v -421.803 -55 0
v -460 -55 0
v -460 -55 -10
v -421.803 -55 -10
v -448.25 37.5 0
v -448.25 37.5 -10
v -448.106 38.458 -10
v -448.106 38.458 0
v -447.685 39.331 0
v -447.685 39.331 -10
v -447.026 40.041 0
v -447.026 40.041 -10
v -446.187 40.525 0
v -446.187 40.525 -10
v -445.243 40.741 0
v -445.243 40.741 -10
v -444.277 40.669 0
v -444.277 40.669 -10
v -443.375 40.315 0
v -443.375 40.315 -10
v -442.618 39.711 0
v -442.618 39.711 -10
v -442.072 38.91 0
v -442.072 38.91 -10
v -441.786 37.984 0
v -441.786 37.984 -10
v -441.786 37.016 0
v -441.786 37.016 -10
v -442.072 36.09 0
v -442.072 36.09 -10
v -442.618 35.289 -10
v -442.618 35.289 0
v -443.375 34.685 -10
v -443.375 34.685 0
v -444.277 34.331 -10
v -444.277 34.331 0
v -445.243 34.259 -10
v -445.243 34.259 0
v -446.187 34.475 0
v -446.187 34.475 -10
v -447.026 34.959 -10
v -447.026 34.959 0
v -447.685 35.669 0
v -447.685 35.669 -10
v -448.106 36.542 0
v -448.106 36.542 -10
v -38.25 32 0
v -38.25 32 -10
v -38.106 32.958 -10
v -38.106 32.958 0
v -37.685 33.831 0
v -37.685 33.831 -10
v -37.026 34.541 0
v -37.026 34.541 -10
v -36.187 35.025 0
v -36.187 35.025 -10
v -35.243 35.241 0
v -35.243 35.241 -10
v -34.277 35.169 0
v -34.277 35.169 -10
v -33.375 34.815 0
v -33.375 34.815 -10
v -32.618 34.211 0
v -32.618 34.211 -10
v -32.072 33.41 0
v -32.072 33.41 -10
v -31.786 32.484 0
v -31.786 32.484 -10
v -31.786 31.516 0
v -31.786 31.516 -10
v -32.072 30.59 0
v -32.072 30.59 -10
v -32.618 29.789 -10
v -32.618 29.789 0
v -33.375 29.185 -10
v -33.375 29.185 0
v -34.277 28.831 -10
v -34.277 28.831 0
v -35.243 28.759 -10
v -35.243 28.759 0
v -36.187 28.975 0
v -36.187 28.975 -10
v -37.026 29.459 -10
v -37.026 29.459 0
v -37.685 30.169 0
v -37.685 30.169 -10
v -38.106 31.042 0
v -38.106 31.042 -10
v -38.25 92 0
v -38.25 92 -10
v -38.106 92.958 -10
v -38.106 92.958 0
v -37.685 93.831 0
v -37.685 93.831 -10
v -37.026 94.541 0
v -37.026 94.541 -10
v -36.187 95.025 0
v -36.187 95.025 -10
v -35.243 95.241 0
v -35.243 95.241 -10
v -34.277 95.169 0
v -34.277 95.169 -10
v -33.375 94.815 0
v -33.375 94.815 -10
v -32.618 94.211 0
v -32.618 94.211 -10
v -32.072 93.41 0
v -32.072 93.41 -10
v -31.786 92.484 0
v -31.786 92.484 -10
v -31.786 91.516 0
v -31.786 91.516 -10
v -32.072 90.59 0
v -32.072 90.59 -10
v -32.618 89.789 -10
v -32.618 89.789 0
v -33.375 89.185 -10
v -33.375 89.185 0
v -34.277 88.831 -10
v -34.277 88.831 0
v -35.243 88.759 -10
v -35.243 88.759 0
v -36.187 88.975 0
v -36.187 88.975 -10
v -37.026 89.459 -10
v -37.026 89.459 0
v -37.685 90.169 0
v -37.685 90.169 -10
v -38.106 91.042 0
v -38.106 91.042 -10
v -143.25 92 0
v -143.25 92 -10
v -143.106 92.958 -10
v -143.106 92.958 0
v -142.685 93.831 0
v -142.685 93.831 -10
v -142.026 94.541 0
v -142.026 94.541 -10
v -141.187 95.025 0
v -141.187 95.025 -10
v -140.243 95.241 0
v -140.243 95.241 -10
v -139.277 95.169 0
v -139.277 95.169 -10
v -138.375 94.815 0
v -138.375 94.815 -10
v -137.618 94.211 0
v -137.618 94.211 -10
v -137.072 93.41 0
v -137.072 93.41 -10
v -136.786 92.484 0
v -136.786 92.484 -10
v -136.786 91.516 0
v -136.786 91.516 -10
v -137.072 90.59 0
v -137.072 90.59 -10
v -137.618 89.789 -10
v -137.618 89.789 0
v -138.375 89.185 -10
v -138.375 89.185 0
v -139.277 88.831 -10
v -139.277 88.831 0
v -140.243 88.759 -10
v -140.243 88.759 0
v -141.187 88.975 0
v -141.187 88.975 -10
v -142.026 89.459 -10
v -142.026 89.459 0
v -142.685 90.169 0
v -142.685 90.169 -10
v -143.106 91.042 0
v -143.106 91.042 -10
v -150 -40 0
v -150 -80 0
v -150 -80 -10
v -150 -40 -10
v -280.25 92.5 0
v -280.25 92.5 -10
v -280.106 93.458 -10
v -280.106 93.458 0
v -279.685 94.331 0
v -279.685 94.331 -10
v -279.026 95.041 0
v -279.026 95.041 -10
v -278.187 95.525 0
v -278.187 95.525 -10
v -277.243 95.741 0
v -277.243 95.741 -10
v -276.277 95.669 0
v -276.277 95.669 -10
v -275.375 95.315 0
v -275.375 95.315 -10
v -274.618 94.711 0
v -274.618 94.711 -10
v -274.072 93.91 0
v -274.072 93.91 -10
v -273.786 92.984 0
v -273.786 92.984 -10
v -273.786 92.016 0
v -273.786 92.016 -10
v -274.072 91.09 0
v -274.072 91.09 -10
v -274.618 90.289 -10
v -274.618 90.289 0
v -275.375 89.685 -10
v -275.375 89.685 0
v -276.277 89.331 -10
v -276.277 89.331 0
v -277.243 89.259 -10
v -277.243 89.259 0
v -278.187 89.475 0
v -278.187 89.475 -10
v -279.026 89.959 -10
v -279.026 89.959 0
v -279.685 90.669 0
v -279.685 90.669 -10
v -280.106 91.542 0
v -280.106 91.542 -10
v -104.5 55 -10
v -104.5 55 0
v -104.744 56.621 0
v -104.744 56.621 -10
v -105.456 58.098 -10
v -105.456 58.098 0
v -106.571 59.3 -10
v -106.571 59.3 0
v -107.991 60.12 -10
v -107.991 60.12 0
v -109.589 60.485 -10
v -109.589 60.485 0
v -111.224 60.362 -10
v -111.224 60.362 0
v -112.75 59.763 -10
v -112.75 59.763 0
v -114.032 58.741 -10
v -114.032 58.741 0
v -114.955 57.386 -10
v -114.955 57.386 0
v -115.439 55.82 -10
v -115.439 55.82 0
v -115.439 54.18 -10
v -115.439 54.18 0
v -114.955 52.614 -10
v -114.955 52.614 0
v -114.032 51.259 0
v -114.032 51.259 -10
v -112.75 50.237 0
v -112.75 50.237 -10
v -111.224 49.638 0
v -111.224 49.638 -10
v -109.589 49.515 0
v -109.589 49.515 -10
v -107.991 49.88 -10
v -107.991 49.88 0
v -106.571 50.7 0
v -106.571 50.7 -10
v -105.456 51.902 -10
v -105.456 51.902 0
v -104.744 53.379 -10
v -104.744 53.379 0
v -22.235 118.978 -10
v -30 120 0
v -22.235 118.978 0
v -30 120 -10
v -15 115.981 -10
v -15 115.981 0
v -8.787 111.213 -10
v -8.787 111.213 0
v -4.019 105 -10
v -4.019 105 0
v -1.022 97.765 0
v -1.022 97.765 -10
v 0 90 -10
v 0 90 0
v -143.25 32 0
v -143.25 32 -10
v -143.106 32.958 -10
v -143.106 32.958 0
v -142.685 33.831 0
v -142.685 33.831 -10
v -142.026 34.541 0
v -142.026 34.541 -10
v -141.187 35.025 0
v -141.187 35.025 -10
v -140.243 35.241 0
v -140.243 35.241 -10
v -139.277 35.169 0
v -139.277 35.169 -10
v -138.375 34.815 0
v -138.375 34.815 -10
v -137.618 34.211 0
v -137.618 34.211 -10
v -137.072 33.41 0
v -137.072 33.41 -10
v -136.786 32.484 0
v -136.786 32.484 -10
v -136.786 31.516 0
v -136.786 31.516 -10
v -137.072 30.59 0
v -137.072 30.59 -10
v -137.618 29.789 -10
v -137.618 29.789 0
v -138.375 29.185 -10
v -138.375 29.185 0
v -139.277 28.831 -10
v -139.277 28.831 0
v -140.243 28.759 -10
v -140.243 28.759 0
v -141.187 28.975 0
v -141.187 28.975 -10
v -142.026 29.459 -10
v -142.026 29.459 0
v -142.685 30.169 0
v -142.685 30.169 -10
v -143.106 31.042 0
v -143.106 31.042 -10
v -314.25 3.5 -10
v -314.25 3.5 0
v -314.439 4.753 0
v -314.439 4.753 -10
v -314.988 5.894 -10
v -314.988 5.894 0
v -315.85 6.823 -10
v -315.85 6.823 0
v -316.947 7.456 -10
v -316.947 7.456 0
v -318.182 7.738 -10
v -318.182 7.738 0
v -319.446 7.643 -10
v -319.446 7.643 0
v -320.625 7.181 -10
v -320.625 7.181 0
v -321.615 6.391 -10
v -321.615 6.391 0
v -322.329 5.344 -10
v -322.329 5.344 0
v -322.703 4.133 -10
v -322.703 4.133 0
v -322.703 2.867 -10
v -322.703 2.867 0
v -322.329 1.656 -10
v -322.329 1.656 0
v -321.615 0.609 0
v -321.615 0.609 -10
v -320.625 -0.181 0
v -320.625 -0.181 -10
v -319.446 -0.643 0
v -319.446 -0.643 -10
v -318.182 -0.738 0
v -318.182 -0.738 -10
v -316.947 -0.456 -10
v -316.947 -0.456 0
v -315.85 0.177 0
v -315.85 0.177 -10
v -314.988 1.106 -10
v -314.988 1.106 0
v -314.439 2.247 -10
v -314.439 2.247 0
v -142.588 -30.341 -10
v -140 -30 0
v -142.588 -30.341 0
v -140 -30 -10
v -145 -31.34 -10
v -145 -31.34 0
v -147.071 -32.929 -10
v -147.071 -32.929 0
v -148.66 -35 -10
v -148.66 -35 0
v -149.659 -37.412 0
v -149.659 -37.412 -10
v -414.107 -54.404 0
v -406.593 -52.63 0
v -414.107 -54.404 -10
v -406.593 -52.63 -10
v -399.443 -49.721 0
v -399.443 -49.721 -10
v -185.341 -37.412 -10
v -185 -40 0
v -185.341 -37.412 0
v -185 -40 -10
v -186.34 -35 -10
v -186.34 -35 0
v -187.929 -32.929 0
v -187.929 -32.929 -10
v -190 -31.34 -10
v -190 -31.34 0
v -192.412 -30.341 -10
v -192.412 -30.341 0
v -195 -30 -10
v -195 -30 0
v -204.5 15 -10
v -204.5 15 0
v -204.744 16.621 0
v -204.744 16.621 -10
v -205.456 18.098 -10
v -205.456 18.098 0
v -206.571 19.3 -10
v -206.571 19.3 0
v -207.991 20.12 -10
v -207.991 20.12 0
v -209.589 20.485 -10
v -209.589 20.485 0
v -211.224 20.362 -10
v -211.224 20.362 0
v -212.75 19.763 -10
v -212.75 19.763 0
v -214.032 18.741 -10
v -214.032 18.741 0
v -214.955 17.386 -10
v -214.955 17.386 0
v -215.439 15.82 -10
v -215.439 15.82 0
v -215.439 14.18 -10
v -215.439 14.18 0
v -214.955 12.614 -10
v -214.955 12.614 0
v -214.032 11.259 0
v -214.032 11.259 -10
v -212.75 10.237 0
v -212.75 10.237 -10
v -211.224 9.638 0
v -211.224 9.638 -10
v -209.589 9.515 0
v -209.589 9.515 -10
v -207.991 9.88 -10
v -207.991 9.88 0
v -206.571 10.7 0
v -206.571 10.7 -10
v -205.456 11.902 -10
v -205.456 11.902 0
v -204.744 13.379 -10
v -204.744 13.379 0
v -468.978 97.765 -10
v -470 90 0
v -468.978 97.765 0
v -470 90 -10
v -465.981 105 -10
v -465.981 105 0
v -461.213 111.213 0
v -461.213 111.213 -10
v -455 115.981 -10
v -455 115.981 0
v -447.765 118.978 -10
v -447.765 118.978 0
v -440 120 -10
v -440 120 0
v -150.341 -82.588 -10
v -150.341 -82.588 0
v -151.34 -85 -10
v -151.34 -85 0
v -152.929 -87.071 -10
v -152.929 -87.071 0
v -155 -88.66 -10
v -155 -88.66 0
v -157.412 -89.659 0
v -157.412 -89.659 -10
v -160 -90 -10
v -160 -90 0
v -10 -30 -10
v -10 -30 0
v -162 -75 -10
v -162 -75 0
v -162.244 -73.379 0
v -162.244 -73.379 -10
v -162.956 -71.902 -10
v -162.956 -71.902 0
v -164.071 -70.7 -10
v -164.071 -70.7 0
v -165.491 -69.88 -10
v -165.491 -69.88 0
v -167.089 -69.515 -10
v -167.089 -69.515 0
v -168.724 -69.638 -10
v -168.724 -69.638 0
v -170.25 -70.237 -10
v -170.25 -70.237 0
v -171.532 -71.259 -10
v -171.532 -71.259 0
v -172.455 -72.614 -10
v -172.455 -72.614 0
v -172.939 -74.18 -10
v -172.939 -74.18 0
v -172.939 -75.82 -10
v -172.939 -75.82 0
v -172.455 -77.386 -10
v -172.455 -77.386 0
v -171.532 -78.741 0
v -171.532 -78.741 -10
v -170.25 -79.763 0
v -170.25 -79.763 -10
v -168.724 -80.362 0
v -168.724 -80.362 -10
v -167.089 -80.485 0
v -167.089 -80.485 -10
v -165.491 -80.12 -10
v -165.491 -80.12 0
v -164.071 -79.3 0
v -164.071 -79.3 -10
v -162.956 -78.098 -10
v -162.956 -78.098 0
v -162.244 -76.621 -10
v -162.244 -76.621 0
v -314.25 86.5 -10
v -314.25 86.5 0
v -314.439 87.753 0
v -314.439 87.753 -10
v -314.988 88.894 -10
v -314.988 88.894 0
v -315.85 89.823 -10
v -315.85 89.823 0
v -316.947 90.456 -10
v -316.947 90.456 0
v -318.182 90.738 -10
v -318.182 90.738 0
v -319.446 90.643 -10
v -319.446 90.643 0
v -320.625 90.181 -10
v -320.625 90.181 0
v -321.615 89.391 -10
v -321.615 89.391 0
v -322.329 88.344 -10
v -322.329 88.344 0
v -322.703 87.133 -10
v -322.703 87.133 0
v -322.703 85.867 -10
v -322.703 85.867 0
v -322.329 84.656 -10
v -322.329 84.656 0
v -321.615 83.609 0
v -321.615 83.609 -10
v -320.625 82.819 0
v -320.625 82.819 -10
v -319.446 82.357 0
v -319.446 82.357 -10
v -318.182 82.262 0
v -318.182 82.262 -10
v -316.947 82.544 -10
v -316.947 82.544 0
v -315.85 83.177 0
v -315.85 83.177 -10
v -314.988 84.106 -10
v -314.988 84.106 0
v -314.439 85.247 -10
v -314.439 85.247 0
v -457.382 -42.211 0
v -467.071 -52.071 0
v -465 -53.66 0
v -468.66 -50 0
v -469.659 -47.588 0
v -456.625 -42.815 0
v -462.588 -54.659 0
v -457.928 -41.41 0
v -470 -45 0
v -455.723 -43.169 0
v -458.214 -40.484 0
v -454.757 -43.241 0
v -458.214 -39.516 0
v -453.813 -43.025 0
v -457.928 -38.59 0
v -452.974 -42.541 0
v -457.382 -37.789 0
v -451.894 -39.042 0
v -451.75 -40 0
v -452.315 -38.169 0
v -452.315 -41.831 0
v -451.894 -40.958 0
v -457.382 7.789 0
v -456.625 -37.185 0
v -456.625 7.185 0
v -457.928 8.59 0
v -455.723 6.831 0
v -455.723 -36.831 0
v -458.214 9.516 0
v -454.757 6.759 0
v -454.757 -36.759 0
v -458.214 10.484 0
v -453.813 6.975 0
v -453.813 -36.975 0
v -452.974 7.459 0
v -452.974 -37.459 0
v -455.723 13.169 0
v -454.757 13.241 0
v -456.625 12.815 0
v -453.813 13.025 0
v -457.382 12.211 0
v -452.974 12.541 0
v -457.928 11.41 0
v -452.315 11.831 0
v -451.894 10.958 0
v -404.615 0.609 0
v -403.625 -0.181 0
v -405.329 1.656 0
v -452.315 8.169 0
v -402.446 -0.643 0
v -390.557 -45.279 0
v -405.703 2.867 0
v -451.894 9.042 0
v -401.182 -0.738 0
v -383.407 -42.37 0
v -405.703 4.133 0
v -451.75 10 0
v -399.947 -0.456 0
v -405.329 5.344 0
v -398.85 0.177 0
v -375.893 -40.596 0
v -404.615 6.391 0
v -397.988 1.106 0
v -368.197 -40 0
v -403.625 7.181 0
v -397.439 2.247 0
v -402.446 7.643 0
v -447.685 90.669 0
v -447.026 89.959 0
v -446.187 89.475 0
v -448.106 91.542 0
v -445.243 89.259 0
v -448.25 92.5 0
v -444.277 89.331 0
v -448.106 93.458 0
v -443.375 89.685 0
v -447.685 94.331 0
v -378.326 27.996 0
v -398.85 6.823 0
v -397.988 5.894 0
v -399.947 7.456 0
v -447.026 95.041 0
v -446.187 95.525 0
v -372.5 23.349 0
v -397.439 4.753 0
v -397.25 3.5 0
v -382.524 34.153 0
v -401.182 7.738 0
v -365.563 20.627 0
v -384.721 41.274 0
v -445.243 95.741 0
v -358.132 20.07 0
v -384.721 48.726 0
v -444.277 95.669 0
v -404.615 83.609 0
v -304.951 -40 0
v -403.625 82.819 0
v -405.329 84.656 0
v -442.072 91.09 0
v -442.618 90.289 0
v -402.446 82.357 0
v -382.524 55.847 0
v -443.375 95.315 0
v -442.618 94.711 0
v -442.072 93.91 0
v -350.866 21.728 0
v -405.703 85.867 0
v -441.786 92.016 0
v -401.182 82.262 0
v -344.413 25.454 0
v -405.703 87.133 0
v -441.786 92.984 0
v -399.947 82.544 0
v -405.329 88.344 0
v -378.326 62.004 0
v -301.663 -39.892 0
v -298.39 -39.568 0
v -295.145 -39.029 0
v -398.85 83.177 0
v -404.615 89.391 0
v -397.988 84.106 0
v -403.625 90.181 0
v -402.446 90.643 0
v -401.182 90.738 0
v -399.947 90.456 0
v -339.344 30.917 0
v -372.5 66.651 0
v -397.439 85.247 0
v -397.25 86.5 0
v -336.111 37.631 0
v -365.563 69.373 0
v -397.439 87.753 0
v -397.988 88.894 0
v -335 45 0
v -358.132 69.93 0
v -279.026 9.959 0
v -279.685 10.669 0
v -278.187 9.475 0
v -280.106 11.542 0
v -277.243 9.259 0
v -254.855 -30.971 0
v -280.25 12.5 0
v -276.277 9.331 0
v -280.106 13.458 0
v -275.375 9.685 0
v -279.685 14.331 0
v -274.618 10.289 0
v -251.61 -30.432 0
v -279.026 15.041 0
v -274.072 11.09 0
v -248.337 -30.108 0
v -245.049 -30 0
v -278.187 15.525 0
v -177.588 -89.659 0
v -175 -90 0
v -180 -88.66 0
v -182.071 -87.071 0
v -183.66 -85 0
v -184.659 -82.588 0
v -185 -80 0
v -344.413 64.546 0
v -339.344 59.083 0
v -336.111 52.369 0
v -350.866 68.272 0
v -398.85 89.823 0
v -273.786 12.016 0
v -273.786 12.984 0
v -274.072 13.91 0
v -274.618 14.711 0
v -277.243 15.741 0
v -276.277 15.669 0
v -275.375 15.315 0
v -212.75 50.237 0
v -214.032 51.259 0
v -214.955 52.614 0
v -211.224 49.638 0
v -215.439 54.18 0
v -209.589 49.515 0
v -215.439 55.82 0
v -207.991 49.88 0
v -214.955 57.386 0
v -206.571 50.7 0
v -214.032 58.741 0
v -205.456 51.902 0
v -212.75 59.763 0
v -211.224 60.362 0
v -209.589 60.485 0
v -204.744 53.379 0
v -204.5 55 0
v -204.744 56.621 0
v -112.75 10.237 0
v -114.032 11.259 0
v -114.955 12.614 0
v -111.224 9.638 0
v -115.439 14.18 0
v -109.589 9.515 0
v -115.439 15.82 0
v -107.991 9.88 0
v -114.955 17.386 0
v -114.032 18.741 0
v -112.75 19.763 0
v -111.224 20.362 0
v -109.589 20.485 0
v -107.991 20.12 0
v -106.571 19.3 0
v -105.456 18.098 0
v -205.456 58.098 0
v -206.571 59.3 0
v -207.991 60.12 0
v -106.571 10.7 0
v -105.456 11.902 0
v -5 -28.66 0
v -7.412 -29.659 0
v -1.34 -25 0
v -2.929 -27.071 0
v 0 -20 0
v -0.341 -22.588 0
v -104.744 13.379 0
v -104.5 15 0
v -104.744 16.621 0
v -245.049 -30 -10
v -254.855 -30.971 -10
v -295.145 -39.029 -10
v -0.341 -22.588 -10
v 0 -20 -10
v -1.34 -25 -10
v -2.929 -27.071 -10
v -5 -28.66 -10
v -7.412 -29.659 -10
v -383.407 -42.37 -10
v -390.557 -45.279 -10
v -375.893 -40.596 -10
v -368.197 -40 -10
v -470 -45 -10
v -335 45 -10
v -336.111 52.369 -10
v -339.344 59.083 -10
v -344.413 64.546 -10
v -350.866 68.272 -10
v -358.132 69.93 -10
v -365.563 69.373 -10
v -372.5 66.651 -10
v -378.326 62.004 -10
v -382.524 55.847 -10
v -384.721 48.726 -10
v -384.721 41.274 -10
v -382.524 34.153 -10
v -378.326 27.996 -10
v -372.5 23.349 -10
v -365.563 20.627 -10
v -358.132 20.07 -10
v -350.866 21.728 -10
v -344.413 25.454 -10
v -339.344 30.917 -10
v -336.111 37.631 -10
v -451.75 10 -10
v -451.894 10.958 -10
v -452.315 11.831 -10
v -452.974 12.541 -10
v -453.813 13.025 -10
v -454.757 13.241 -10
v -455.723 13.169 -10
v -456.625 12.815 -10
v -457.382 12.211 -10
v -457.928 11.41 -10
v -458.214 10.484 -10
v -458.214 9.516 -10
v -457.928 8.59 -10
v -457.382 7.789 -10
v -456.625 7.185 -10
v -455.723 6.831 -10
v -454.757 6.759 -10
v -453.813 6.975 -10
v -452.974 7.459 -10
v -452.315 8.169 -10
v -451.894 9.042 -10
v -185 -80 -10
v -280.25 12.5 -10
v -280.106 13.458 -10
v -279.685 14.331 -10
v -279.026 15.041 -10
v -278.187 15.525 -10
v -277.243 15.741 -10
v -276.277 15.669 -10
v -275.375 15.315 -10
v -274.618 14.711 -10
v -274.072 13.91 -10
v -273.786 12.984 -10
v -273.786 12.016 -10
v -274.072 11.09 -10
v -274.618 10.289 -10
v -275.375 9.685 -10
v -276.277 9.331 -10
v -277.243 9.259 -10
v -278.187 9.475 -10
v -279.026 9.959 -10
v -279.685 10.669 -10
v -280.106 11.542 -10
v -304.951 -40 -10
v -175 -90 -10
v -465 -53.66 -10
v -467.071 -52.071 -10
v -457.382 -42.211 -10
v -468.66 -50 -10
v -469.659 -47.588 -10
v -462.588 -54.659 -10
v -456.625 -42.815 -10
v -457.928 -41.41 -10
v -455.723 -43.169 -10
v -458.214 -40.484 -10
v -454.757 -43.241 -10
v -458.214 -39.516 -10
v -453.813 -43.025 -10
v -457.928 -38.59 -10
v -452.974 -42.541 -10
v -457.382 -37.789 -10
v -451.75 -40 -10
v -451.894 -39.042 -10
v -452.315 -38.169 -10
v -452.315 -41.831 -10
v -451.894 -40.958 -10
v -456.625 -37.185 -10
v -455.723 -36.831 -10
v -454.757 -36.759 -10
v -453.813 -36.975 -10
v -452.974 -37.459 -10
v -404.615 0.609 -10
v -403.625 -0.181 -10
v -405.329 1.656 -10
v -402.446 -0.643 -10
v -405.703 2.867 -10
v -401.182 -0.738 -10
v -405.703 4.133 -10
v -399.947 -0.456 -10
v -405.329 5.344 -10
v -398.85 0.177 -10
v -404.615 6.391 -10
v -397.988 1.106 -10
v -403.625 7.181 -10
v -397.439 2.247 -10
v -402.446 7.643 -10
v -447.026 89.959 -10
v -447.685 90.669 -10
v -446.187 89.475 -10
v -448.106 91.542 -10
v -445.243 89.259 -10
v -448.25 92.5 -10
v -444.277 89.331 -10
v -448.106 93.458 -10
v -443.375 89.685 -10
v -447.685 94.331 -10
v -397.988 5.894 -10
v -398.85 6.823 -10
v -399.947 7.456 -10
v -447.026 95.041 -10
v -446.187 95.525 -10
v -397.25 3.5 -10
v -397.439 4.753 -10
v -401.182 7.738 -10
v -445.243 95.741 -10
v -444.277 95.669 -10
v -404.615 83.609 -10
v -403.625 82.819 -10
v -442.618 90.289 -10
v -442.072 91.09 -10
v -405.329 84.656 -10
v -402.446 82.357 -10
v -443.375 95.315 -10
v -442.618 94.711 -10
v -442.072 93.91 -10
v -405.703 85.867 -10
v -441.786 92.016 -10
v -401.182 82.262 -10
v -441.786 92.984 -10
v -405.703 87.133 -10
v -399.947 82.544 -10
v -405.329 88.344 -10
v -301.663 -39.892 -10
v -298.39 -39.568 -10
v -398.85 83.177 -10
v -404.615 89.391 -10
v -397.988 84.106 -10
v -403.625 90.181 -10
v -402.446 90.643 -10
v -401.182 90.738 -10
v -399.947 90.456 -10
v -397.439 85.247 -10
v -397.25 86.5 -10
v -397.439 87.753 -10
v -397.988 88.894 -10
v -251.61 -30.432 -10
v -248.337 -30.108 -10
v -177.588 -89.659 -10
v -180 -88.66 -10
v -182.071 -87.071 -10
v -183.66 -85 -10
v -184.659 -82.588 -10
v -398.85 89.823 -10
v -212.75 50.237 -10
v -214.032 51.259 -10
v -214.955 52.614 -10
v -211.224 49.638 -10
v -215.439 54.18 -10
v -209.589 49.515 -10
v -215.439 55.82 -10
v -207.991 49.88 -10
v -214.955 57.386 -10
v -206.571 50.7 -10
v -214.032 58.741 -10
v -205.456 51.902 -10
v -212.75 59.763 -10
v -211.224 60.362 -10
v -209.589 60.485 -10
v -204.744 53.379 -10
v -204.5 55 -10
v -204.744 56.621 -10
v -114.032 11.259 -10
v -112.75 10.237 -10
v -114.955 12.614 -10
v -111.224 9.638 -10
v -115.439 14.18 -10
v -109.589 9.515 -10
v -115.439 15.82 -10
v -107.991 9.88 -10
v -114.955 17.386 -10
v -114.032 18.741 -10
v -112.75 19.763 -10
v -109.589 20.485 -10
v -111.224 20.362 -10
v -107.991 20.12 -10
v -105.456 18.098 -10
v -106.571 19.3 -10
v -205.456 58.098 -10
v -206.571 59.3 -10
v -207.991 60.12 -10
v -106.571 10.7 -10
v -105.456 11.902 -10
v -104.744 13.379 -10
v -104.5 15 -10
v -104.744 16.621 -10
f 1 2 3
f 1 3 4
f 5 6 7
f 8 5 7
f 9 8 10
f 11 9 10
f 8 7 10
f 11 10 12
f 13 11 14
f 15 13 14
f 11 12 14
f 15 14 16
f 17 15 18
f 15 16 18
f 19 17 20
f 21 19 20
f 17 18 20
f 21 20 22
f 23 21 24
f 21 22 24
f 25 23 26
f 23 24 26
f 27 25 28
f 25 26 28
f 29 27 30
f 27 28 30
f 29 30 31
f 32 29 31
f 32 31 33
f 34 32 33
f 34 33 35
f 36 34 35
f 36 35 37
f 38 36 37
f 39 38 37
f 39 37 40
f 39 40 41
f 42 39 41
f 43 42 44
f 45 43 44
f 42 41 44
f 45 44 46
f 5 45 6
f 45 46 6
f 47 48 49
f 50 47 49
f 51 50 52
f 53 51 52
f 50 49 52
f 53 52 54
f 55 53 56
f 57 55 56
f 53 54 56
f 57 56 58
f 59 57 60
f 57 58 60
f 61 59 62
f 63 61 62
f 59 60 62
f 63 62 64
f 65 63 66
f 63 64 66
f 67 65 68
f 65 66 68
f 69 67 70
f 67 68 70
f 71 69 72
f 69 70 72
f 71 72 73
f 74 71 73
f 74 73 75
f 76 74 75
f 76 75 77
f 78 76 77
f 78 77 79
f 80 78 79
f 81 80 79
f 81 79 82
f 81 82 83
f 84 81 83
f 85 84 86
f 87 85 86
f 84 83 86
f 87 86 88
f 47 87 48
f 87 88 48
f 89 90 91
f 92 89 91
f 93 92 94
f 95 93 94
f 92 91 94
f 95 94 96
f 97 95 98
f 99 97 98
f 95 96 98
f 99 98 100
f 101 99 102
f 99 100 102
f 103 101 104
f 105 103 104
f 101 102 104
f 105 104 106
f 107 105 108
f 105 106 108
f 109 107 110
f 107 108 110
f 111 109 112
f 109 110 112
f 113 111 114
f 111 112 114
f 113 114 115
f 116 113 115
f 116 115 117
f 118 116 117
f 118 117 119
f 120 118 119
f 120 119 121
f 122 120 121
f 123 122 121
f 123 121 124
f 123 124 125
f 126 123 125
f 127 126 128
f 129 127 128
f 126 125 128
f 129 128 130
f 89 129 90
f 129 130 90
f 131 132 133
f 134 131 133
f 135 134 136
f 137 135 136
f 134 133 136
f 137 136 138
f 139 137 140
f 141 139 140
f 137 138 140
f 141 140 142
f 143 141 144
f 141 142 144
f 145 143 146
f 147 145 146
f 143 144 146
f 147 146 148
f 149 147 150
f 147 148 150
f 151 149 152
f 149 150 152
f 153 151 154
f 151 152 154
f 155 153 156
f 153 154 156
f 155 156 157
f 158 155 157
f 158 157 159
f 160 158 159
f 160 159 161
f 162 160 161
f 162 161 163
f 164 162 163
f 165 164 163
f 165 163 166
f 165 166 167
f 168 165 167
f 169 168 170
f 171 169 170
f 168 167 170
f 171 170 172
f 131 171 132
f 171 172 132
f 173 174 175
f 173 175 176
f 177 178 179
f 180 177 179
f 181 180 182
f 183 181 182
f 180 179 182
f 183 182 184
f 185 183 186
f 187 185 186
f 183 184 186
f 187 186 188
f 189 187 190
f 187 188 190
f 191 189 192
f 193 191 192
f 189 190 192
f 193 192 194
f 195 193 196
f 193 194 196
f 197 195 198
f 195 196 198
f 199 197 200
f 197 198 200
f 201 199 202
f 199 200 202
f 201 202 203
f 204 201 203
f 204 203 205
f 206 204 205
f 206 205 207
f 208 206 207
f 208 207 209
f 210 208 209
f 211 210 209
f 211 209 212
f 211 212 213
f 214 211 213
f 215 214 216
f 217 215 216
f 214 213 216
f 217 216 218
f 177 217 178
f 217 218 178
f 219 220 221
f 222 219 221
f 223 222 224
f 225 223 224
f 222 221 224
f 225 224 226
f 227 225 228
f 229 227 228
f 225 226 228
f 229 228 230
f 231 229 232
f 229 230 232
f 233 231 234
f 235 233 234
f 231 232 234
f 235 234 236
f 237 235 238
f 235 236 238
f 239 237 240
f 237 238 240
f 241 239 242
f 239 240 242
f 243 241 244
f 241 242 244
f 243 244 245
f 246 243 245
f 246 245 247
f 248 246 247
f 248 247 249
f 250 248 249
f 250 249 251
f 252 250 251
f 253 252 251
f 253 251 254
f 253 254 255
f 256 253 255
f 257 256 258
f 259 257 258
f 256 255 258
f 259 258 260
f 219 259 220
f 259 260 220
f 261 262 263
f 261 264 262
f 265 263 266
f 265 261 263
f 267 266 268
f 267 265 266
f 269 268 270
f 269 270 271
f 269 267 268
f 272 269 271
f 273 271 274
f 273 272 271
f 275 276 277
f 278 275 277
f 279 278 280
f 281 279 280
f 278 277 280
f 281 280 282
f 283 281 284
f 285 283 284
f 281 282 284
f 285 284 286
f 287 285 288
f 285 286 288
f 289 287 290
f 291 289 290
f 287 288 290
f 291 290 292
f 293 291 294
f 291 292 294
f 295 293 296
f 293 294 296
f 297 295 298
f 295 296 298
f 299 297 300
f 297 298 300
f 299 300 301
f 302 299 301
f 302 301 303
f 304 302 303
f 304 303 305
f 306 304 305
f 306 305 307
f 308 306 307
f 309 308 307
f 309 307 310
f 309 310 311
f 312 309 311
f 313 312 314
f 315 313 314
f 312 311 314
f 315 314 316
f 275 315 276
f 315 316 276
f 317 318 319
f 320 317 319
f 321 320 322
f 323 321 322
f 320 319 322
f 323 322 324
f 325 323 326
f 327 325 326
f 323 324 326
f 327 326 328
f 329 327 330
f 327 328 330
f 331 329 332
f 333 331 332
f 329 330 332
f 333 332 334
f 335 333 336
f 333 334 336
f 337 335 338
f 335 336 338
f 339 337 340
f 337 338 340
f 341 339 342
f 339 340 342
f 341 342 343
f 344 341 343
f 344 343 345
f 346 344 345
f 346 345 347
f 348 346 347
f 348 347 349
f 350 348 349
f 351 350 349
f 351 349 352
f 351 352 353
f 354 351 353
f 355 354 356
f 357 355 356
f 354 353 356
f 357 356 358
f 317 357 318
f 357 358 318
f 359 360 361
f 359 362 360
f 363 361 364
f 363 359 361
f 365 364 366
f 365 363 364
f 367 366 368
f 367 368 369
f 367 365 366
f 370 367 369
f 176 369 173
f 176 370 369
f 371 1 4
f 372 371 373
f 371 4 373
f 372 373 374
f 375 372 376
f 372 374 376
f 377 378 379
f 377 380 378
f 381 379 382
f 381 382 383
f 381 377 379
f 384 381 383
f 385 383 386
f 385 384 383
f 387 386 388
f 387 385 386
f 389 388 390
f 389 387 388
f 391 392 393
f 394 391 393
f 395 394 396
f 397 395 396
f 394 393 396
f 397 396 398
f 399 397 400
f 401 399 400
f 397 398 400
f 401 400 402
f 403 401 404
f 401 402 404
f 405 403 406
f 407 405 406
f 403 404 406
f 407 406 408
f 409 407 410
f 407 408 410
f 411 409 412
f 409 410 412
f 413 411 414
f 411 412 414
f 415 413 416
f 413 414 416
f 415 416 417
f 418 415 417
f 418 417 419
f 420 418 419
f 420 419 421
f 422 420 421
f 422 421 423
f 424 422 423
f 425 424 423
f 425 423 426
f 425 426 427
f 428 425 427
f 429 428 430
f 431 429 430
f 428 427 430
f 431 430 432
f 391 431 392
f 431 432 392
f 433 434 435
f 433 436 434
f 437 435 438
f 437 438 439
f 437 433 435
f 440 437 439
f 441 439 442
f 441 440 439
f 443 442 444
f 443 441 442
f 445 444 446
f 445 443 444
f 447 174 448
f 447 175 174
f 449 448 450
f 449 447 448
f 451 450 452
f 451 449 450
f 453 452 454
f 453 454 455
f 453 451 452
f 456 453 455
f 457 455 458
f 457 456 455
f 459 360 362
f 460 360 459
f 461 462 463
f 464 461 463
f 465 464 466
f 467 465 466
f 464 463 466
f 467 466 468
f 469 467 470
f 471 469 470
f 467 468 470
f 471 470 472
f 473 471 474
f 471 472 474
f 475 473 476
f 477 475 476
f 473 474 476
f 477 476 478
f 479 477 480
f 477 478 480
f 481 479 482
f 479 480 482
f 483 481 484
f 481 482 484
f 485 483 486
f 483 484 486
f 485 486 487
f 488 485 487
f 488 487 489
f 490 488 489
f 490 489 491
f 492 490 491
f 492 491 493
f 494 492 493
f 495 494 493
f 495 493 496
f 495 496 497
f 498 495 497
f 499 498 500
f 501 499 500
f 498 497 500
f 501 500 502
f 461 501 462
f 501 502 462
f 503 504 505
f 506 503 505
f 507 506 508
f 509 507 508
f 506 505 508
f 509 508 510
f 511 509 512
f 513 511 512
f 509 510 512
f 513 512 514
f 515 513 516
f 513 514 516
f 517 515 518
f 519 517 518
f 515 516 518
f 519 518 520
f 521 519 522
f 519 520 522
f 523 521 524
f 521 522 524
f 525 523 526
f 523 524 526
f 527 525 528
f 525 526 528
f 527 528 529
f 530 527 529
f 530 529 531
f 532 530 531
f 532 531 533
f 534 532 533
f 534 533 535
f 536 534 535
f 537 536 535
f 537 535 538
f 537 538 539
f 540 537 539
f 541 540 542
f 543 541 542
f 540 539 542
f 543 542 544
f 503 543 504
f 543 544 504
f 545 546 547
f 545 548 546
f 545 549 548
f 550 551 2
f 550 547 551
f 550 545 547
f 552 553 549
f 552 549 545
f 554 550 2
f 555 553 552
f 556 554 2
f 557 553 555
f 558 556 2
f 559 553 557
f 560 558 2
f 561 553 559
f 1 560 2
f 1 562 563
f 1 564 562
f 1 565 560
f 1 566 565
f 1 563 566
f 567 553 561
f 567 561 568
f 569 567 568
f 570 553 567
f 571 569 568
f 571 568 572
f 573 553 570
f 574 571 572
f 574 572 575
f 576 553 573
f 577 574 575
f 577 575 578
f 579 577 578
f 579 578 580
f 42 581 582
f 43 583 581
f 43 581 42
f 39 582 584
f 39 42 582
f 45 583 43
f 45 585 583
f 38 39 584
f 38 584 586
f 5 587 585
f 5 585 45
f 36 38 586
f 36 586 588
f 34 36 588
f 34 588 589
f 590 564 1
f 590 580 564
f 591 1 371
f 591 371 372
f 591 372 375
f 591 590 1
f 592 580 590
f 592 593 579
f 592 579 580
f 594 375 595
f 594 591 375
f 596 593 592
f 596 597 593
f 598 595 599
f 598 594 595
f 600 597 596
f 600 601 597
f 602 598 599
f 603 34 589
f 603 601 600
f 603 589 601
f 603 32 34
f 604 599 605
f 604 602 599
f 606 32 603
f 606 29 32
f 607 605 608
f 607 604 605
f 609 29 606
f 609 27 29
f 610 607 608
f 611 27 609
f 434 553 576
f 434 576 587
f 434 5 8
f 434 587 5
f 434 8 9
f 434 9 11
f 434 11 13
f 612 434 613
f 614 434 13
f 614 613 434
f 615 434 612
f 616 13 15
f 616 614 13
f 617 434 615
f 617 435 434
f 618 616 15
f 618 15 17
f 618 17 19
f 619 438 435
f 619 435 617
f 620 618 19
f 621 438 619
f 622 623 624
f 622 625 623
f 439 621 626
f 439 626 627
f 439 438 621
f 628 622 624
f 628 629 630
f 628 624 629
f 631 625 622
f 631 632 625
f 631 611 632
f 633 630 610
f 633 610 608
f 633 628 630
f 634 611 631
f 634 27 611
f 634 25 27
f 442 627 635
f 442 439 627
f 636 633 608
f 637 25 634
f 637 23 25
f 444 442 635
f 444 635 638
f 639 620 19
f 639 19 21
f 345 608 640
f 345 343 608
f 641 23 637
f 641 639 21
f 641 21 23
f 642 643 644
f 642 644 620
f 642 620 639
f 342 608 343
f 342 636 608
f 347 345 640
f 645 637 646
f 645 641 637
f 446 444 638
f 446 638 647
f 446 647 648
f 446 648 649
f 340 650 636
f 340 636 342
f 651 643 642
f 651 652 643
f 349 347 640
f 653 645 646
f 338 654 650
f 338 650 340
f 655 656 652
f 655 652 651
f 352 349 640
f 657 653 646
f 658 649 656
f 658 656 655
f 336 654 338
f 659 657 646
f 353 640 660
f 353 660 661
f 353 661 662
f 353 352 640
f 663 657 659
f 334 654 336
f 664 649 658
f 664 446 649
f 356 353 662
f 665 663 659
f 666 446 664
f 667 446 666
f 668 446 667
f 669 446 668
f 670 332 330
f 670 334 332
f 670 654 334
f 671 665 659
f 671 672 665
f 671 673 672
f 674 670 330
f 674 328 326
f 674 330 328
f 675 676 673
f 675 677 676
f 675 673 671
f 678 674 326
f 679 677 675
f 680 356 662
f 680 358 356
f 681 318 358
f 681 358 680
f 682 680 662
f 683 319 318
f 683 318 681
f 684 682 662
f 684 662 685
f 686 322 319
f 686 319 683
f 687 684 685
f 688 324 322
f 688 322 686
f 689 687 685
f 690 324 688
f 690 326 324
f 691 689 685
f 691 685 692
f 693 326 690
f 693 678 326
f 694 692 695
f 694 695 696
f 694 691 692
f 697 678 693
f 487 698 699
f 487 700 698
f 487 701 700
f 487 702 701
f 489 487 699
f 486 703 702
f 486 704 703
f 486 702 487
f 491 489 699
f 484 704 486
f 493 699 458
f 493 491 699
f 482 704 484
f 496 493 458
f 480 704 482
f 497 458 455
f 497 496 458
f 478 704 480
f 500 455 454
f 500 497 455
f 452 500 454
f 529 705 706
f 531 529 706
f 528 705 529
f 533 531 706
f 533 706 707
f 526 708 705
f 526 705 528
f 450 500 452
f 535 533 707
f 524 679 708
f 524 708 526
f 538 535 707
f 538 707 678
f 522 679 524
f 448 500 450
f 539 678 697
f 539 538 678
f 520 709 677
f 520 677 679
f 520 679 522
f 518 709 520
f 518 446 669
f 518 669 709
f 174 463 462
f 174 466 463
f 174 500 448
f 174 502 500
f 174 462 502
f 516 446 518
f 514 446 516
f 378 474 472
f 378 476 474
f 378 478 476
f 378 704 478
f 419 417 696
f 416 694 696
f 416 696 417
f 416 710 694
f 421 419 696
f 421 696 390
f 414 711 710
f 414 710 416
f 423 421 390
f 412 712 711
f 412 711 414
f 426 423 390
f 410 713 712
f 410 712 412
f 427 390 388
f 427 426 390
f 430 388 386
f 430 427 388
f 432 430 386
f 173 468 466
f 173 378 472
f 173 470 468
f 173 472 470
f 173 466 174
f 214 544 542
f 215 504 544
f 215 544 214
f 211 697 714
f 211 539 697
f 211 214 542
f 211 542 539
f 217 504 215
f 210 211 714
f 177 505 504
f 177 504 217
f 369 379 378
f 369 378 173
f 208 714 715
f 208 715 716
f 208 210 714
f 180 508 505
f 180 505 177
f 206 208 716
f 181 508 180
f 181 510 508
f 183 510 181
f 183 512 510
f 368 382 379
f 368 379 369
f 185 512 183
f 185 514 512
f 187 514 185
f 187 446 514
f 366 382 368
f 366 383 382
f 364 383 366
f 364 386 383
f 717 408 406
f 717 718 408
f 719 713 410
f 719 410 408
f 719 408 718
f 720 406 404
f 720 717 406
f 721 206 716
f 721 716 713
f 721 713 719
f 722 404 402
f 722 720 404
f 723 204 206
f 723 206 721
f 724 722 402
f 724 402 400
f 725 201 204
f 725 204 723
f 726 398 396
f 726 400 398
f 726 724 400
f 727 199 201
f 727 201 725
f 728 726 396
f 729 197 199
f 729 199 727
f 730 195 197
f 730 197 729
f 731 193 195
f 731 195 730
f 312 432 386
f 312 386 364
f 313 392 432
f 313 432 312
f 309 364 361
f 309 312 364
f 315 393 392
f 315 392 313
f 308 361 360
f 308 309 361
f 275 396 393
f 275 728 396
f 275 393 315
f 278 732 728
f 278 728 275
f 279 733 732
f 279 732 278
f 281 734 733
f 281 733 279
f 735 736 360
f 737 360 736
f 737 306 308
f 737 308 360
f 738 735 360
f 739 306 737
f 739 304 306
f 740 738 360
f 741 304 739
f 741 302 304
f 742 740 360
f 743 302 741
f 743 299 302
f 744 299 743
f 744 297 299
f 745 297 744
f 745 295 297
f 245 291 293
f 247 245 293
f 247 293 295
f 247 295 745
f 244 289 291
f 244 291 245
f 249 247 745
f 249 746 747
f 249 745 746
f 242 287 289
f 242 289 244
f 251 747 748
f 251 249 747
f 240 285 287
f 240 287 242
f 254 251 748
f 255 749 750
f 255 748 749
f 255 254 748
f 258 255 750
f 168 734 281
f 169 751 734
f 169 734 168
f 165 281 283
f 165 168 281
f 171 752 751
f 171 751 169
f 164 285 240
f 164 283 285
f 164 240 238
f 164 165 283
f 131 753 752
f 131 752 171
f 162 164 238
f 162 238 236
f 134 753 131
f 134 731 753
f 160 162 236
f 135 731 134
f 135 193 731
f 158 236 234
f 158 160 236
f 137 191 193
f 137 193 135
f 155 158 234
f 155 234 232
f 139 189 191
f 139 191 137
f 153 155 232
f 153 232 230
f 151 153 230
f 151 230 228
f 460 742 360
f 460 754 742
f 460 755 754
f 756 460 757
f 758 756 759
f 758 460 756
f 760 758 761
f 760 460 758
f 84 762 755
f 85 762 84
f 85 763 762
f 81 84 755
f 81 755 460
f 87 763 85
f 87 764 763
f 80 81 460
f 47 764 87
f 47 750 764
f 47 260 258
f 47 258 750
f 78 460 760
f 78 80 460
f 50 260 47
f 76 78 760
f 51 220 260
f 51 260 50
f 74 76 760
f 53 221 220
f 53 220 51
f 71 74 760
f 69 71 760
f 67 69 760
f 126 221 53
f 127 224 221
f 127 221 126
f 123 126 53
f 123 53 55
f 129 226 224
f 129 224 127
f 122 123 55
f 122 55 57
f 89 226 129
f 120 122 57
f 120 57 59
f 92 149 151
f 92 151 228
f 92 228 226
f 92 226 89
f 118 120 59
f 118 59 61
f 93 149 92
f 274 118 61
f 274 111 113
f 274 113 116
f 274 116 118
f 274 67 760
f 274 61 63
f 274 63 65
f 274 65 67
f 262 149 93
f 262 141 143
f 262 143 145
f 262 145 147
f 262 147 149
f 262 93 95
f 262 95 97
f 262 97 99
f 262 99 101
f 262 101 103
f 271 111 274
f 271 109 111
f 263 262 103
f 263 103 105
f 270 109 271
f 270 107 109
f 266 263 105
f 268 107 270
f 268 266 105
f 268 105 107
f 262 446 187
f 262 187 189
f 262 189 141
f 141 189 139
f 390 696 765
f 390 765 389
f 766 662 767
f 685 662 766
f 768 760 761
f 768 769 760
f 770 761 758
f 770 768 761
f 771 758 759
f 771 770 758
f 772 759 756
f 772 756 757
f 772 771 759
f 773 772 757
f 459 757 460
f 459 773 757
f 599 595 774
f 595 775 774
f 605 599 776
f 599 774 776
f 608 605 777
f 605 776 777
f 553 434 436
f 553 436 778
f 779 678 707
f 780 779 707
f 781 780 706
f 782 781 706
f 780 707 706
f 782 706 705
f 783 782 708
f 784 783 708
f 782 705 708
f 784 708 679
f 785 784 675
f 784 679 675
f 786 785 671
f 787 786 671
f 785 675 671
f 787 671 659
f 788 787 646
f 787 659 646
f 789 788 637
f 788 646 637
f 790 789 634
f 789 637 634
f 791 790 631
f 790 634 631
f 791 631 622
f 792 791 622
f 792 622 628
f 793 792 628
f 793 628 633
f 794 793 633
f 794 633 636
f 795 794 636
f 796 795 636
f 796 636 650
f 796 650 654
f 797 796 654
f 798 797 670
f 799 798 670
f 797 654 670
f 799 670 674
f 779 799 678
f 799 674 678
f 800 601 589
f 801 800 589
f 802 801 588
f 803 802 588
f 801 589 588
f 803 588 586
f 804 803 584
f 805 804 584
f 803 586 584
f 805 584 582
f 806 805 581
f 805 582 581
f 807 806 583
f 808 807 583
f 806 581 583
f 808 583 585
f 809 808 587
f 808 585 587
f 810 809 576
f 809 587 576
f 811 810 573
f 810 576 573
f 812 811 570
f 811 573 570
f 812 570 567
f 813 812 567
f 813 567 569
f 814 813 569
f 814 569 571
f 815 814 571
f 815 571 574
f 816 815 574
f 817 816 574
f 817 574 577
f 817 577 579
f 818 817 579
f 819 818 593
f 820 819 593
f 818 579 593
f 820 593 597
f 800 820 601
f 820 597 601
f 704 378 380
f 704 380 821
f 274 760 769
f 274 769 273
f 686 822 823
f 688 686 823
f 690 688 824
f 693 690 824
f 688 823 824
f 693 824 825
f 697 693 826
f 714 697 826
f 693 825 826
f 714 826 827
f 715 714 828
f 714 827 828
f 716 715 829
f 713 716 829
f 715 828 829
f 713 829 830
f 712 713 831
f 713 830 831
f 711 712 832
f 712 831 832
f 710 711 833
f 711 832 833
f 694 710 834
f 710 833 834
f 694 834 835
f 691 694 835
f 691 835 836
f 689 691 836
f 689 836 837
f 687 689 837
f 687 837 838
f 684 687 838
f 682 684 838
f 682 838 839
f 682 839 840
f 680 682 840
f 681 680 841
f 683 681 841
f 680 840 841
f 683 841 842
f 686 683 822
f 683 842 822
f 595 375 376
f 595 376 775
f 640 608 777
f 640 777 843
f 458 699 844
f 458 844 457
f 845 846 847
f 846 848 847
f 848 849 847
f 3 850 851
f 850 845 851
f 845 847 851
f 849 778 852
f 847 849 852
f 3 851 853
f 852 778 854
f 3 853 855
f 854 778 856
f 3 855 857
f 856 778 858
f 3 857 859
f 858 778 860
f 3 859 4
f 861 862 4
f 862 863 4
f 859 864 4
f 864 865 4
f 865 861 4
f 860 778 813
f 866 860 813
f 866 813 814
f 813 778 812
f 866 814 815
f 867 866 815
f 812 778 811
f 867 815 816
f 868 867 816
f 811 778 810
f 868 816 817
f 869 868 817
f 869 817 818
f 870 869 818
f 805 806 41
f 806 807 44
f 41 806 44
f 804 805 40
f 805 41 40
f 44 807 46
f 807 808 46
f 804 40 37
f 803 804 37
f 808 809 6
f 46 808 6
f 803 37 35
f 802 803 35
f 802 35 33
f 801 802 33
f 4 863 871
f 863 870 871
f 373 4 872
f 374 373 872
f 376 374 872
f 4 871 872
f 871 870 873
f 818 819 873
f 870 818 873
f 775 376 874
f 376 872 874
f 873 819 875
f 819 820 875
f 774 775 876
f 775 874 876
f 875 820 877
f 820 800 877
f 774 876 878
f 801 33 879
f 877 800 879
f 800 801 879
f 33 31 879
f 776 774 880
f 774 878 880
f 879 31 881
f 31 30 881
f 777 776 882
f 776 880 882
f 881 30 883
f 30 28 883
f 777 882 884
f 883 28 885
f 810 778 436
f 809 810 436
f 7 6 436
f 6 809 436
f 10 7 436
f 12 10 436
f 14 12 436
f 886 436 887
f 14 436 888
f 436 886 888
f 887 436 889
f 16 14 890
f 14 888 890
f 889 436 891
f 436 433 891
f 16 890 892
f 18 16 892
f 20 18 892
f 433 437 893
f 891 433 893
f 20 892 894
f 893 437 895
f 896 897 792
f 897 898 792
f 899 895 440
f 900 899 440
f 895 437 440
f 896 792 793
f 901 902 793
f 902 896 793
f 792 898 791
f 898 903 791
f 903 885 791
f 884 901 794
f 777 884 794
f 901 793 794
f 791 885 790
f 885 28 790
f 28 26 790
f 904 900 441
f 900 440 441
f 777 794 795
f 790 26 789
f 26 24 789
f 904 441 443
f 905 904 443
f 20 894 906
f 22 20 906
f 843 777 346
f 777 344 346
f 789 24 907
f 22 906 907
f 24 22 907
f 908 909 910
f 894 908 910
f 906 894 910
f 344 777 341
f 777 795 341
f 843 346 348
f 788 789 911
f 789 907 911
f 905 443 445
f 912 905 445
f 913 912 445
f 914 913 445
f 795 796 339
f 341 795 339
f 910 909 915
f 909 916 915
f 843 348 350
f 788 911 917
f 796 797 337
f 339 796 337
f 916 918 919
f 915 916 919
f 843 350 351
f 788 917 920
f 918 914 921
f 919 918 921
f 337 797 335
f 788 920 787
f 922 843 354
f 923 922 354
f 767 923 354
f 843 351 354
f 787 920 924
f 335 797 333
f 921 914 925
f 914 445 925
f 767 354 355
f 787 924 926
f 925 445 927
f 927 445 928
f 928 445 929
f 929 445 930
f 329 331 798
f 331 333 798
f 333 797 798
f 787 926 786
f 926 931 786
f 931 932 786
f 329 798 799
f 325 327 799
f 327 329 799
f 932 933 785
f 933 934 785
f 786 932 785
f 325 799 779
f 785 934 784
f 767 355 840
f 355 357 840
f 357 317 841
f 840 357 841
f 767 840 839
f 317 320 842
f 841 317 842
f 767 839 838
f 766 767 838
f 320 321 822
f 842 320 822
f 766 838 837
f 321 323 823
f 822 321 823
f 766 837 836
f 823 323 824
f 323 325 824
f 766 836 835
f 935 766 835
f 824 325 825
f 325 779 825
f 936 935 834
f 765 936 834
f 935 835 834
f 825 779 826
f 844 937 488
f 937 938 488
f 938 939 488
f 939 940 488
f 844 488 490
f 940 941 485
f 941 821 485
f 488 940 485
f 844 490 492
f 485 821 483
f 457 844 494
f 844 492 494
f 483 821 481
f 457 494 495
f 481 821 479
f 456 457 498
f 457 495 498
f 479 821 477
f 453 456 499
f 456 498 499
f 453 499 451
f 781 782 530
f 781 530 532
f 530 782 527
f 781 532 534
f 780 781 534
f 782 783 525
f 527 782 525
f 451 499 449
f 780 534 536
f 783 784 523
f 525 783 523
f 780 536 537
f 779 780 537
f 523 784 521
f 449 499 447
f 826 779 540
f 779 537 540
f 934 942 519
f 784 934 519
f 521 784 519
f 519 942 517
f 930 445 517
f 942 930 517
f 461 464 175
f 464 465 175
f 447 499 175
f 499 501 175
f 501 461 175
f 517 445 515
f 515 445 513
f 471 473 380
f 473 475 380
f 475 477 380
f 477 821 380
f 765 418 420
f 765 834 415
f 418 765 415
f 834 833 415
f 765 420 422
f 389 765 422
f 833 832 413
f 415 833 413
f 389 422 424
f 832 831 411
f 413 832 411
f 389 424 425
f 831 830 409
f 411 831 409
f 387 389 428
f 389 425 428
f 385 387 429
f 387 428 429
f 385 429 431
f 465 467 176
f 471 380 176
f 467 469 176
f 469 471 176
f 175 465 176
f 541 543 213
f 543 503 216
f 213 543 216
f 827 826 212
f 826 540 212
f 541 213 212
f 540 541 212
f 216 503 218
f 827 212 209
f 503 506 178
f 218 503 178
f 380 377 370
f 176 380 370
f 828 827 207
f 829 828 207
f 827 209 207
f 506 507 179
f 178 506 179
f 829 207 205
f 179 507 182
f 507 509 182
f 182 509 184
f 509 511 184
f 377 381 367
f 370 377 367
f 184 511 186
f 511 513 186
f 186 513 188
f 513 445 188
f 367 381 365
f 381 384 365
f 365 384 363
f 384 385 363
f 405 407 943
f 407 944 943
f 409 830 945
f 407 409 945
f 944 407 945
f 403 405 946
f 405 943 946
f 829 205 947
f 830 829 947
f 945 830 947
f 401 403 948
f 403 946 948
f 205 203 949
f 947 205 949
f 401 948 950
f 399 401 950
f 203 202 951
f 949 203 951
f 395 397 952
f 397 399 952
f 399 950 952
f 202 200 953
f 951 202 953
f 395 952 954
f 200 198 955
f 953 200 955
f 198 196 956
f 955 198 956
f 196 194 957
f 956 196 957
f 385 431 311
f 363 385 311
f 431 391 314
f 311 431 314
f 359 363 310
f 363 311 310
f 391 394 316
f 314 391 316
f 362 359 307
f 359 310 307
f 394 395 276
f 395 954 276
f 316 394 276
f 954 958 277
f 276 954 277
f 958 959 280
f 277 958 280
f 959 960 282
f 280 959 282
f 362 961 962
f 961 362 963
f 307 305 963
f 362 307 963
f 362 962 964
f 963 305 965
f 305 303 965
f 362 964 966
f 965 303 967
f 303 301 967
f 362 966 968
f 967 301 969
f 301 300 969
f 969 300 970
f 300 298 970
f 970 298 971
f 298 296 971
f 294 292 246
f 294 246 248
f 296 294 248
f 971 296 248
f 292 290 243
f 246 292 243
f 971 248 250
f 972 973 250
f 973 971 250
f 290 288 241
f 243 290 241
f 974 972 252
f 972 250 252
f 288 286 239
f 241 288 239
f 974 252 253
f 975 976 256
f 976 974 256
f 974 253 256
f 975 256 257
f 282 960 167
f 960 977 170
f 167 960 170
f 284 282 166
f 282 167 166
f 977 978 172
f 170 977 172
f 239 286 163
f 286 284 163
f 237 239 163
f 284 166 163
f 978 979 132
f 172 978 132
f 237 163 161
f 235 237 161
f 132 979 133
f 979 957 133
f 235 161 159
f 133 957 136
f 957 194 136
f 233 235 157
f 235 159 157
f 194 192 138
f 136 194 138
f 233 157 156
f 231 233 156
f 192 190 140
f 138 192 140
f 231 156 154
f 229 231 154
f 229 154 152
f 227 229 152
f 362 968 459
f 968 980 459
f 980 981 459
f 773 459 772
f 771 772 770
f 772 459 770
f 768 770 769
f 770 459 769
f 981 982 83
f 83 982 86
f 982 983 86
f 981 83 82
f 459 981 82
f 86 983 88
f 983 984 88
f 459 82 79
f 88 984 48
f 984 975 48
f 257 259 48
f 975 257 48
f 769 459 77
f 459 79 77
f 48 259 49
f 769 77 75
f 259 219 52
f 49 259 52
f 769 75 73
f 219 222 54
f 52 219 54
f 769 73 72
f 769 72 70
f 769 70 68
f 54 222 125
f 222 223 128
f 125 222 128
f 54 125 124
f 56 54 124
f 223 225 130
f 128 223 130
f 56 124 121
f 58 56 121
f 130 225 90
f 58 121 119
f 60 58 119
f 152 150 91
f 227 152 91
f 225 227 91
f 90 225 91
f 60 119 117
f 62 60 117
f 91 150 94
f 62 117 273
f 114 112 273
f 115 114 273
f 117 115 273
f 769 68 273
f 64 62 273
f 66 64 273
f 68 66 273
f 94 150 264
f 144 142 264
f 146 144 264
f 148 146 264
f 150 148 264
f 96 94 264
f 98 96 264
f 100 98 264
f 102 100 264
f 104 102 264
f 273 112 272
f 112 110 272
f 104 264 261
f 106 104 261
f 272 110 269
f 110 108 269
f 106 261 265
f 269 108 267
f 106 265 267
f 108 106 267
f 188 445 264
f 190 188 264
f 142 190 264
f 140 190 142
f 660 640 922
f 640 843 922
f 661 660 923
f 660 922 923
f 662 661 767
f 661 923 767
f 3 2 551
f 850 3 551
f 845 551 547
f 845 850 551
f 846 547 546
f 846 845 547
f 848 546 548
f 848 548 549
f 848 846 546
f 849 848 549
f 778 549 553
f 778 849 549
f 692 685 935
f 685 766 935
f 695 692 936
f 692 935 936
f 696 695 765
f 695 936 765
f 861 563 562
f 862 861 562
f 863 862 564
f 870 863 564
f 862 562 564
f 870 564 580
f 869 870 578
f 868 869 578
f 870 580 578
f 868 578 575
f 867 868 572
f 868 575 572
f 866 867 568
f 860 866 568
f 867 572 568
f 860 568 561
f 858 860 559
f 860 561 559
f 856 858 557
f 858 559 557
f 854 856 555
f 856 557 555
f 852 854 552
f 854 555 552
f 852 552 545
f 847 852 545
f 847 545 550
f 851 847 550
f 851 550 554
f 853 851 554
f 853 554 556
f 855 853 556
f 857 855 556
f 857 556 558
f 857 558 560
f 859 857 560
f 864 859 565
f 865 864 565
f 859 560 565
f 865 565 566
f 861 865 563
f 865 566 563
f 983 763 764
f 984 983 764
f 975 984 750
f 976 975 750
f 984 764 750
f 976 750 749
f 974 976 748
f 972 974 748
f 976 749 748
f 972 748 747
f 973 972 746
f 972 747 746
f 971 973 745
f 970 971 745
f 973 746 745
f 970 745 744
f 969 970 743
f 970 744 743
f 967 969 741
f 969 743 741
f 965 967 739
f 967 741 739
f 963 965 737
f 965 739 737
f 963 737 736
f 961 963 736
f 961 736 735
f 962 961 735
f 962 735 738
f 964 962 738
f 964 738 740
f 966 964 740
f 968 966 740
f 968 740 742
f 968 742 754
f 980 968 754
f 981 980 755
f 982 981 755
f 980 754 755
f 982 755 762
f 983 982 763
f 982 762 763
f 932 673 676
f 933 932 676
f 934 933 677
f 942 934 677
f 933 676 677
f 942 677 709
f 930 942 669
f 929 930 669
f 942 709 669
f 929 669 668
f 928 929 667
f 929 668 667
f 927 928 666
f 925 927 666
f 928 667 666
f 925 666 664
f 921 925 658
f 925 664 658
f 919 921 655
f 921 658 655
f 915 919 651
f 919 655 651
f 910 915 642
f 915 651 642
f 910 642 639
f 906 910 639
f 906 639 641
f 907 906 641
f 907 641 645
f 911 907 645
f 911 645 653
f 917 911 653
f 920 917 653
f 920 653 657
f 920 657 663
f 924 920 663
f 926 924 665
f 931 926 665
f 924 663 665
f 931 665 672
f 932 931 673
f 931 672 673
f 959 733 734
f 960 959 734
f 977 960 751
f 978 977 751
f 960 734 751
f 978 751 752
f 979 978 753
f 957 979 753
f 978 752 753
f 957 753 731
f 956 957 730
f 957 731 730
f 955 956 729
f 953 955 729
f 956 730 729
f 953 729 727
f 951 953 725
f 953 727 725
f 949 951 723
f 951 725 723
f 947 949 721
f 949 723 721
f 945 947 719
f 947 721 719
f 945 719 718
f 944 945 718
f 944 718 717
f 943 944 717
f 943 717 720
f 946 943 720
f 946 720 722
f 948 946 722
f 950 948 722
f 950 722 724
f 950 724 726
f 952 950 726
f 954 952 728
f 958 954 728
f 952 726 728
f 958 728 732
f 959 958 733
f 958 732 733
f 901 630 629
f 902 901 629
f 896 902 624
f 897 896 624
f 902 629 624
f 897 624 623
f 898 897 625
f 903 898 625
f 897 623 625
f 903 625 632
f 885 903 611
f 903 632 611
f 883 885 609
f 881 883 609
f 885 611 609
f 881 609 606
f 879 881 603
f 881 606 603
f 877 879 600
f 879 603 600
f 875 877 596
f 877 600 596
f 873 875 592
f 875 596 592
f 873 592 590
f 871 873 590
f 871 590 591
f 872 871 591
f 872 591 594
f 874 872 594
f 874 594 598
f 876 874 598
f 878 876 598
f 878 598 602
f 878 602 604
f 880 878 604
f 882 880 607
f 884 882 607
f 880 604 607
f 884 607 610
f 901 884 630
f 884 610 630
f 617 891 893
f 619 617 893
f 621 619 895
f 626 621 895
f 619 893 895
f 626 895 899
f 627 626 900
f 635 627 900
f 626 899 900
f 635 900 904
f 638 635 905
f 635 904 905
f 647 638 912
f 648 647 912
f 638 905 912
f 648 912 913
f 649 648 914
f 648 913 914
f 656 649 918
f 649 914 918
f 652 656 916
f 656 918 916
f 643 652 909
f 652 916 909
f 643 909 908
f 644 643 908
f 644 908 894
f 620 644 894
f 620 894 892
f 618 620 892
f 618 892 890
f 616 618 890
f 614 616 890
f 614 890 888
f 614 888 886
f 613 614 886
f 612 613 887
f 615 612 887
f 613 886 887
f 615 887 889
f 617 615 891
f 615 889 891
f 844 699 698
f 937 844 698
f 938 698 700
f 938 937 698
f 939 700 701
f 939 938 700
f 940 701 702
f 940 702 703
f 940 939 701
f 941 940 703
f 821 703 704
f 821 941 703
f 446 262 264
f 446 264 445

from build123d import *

# Parameters (mm, degrees)
TABAN_FLAN_1_DEPTH    = 10
IZIM2_R               = 25
IZIM2_R_2             = 4.25
IZIM2_R_3             = 5.5
IZIM2_R_4             = 3.25
KES_EKSTR_ZYON1_DEPTH = 10
RADYUS3_R             = 30
RADYUS4_R             = 10
RADYUS5_R             = 50
IZIM3_R               = 3.25
KES_EKSTR_ZYON2_DEPTH = 10
RADYUS7_R             = 10
RADYUS8_R             = 30


# Sheet-metal steps are written as plain solids
with BuildPart() as part:
    # Çizim1 → Taban-Flanş1 (new body)
    with BuildSketch(Plane.XY):
        Polygon((0, 120), (-470, 120), (-470, -55), (-410, -55), (-380, -40), (-300, -40), (-250, -30), (-185, -30), (-185, -90), (-150, -90), (-150, -30), (0, -30), (0, 0), align=None)
    extrude(amount=-TABAN_FLAN_1_DEPTH)

    # Çizim2 → Kes-Ekstrüzyon1 (cut)
    with BuildSketch(Plane.XY):
        with Locations((-360, 45)):
            Circle(IZIM2_R)
        with Locations((-401.5, 86.5)):
            Circle(IZIM2_R_2)
        with Locations((-318.5, 86.5)):
            Circle(IZIM2_R_2)
        with Locations((-401.5, 3.5)):
            Circle(IZIM2_R_2)
        with Locations((-318.5, 3.5)):
            Circle(IZIM2_R_2)
        with Locations((-110, 55)):
            Circle(IZIM2_R_3)
        with Locations((-210, 55)):
            Circle(IZIM2_R_3)
        with Locations((-210, 15)):
            Circle(IZIM2_R_3)
        with Locations((-110, 15)):
            Circle(IZIM2_R_3)
        with Locations((-167.5, -75)):
            Circle(IZIM2_R_3)
        with Locations((-455, 10)):
            Circle(IZIM2_R_4)
        with Locations((-455, -40)):
            Circle(IZIM2_R_4)
    extrude(amount=-KES_EKSTR_ZYON1_DEPTH, mode=Mode.SUBTRACT)

    # Radyus3
    radyus3_edges = [part.edges().sort_by_distance(p)[0] for p in [
        (0, 120, -5),
    ]]
    fillet(radyus3_edges, radius=RADYUS3_R)

    # Radyus4
    radyus4_edges = [part.edges().sort_by_distance(p)[0] for p in [
        (0, -30, -5),
        (-150, -30, -5),
        (-150, -90, -5),
        (-185, -90, -5),
        (-185, -30, -5),
    ]]
    fillet(radyus4_edges, radius=RADYUS4_R)

    # Radyus5
    radyus5_edges = [part.edges().sort_by_distance(p)[0] for p in [
        (-250, -30, -5),
        (-300, -40, -5),
        (-380, -40, -5),
        (-410, -55, -5),
    ]]
    fillet(radyus5_edges, radius=RADYUS5_R)

    # Çizim3 → Kes-Ekstrüzyon2 (cut)
    with BuildSketch(Plane(origin=(0, 0, -10), x_dir=(-1, 0, 0), z_dir=(0, 0, -1))):
        with Locations((277, 92.5)):
            Circle(IZIM3_R)
        with Locations((277, 12.5)):
            Circle(IZIM3_R)
        with Locations((445, 37.5)):
            Circle(IZIM3_R)
        with Locations((445, 92.5)):
            Circle(IZIM3_R)
        with Locations((140, 92)):
            Circle(IZIM3_R)
        with Locations((35, 92)):
            Circle(IZIM3_R)
        with Locations((35, 32)):
            Circle(IZIM3_R)
        with Locations((140, 32)):
            Circle(IZIM3_R)
    extrude(amount=-KES_EKSTR_ZYON2_DEPTH, mode=Mode.SUBTRACT)

    # Radyus7
    radyus7_edges = [part.edges().sort_by_distance(p)[0] for p in [
        (-470, -55, -5),
    ]]
    fillet(radyus7_edges, radius=RADYUS7_R)

    # Radyus8
    radyus8_edges = [part.edges().sort_by_distance(p)[0] for p in [
        (-470, 120, -5),
    ]]
    fillet(radyus8_edges, radius=RADYUS8_R)


solid = part.part
